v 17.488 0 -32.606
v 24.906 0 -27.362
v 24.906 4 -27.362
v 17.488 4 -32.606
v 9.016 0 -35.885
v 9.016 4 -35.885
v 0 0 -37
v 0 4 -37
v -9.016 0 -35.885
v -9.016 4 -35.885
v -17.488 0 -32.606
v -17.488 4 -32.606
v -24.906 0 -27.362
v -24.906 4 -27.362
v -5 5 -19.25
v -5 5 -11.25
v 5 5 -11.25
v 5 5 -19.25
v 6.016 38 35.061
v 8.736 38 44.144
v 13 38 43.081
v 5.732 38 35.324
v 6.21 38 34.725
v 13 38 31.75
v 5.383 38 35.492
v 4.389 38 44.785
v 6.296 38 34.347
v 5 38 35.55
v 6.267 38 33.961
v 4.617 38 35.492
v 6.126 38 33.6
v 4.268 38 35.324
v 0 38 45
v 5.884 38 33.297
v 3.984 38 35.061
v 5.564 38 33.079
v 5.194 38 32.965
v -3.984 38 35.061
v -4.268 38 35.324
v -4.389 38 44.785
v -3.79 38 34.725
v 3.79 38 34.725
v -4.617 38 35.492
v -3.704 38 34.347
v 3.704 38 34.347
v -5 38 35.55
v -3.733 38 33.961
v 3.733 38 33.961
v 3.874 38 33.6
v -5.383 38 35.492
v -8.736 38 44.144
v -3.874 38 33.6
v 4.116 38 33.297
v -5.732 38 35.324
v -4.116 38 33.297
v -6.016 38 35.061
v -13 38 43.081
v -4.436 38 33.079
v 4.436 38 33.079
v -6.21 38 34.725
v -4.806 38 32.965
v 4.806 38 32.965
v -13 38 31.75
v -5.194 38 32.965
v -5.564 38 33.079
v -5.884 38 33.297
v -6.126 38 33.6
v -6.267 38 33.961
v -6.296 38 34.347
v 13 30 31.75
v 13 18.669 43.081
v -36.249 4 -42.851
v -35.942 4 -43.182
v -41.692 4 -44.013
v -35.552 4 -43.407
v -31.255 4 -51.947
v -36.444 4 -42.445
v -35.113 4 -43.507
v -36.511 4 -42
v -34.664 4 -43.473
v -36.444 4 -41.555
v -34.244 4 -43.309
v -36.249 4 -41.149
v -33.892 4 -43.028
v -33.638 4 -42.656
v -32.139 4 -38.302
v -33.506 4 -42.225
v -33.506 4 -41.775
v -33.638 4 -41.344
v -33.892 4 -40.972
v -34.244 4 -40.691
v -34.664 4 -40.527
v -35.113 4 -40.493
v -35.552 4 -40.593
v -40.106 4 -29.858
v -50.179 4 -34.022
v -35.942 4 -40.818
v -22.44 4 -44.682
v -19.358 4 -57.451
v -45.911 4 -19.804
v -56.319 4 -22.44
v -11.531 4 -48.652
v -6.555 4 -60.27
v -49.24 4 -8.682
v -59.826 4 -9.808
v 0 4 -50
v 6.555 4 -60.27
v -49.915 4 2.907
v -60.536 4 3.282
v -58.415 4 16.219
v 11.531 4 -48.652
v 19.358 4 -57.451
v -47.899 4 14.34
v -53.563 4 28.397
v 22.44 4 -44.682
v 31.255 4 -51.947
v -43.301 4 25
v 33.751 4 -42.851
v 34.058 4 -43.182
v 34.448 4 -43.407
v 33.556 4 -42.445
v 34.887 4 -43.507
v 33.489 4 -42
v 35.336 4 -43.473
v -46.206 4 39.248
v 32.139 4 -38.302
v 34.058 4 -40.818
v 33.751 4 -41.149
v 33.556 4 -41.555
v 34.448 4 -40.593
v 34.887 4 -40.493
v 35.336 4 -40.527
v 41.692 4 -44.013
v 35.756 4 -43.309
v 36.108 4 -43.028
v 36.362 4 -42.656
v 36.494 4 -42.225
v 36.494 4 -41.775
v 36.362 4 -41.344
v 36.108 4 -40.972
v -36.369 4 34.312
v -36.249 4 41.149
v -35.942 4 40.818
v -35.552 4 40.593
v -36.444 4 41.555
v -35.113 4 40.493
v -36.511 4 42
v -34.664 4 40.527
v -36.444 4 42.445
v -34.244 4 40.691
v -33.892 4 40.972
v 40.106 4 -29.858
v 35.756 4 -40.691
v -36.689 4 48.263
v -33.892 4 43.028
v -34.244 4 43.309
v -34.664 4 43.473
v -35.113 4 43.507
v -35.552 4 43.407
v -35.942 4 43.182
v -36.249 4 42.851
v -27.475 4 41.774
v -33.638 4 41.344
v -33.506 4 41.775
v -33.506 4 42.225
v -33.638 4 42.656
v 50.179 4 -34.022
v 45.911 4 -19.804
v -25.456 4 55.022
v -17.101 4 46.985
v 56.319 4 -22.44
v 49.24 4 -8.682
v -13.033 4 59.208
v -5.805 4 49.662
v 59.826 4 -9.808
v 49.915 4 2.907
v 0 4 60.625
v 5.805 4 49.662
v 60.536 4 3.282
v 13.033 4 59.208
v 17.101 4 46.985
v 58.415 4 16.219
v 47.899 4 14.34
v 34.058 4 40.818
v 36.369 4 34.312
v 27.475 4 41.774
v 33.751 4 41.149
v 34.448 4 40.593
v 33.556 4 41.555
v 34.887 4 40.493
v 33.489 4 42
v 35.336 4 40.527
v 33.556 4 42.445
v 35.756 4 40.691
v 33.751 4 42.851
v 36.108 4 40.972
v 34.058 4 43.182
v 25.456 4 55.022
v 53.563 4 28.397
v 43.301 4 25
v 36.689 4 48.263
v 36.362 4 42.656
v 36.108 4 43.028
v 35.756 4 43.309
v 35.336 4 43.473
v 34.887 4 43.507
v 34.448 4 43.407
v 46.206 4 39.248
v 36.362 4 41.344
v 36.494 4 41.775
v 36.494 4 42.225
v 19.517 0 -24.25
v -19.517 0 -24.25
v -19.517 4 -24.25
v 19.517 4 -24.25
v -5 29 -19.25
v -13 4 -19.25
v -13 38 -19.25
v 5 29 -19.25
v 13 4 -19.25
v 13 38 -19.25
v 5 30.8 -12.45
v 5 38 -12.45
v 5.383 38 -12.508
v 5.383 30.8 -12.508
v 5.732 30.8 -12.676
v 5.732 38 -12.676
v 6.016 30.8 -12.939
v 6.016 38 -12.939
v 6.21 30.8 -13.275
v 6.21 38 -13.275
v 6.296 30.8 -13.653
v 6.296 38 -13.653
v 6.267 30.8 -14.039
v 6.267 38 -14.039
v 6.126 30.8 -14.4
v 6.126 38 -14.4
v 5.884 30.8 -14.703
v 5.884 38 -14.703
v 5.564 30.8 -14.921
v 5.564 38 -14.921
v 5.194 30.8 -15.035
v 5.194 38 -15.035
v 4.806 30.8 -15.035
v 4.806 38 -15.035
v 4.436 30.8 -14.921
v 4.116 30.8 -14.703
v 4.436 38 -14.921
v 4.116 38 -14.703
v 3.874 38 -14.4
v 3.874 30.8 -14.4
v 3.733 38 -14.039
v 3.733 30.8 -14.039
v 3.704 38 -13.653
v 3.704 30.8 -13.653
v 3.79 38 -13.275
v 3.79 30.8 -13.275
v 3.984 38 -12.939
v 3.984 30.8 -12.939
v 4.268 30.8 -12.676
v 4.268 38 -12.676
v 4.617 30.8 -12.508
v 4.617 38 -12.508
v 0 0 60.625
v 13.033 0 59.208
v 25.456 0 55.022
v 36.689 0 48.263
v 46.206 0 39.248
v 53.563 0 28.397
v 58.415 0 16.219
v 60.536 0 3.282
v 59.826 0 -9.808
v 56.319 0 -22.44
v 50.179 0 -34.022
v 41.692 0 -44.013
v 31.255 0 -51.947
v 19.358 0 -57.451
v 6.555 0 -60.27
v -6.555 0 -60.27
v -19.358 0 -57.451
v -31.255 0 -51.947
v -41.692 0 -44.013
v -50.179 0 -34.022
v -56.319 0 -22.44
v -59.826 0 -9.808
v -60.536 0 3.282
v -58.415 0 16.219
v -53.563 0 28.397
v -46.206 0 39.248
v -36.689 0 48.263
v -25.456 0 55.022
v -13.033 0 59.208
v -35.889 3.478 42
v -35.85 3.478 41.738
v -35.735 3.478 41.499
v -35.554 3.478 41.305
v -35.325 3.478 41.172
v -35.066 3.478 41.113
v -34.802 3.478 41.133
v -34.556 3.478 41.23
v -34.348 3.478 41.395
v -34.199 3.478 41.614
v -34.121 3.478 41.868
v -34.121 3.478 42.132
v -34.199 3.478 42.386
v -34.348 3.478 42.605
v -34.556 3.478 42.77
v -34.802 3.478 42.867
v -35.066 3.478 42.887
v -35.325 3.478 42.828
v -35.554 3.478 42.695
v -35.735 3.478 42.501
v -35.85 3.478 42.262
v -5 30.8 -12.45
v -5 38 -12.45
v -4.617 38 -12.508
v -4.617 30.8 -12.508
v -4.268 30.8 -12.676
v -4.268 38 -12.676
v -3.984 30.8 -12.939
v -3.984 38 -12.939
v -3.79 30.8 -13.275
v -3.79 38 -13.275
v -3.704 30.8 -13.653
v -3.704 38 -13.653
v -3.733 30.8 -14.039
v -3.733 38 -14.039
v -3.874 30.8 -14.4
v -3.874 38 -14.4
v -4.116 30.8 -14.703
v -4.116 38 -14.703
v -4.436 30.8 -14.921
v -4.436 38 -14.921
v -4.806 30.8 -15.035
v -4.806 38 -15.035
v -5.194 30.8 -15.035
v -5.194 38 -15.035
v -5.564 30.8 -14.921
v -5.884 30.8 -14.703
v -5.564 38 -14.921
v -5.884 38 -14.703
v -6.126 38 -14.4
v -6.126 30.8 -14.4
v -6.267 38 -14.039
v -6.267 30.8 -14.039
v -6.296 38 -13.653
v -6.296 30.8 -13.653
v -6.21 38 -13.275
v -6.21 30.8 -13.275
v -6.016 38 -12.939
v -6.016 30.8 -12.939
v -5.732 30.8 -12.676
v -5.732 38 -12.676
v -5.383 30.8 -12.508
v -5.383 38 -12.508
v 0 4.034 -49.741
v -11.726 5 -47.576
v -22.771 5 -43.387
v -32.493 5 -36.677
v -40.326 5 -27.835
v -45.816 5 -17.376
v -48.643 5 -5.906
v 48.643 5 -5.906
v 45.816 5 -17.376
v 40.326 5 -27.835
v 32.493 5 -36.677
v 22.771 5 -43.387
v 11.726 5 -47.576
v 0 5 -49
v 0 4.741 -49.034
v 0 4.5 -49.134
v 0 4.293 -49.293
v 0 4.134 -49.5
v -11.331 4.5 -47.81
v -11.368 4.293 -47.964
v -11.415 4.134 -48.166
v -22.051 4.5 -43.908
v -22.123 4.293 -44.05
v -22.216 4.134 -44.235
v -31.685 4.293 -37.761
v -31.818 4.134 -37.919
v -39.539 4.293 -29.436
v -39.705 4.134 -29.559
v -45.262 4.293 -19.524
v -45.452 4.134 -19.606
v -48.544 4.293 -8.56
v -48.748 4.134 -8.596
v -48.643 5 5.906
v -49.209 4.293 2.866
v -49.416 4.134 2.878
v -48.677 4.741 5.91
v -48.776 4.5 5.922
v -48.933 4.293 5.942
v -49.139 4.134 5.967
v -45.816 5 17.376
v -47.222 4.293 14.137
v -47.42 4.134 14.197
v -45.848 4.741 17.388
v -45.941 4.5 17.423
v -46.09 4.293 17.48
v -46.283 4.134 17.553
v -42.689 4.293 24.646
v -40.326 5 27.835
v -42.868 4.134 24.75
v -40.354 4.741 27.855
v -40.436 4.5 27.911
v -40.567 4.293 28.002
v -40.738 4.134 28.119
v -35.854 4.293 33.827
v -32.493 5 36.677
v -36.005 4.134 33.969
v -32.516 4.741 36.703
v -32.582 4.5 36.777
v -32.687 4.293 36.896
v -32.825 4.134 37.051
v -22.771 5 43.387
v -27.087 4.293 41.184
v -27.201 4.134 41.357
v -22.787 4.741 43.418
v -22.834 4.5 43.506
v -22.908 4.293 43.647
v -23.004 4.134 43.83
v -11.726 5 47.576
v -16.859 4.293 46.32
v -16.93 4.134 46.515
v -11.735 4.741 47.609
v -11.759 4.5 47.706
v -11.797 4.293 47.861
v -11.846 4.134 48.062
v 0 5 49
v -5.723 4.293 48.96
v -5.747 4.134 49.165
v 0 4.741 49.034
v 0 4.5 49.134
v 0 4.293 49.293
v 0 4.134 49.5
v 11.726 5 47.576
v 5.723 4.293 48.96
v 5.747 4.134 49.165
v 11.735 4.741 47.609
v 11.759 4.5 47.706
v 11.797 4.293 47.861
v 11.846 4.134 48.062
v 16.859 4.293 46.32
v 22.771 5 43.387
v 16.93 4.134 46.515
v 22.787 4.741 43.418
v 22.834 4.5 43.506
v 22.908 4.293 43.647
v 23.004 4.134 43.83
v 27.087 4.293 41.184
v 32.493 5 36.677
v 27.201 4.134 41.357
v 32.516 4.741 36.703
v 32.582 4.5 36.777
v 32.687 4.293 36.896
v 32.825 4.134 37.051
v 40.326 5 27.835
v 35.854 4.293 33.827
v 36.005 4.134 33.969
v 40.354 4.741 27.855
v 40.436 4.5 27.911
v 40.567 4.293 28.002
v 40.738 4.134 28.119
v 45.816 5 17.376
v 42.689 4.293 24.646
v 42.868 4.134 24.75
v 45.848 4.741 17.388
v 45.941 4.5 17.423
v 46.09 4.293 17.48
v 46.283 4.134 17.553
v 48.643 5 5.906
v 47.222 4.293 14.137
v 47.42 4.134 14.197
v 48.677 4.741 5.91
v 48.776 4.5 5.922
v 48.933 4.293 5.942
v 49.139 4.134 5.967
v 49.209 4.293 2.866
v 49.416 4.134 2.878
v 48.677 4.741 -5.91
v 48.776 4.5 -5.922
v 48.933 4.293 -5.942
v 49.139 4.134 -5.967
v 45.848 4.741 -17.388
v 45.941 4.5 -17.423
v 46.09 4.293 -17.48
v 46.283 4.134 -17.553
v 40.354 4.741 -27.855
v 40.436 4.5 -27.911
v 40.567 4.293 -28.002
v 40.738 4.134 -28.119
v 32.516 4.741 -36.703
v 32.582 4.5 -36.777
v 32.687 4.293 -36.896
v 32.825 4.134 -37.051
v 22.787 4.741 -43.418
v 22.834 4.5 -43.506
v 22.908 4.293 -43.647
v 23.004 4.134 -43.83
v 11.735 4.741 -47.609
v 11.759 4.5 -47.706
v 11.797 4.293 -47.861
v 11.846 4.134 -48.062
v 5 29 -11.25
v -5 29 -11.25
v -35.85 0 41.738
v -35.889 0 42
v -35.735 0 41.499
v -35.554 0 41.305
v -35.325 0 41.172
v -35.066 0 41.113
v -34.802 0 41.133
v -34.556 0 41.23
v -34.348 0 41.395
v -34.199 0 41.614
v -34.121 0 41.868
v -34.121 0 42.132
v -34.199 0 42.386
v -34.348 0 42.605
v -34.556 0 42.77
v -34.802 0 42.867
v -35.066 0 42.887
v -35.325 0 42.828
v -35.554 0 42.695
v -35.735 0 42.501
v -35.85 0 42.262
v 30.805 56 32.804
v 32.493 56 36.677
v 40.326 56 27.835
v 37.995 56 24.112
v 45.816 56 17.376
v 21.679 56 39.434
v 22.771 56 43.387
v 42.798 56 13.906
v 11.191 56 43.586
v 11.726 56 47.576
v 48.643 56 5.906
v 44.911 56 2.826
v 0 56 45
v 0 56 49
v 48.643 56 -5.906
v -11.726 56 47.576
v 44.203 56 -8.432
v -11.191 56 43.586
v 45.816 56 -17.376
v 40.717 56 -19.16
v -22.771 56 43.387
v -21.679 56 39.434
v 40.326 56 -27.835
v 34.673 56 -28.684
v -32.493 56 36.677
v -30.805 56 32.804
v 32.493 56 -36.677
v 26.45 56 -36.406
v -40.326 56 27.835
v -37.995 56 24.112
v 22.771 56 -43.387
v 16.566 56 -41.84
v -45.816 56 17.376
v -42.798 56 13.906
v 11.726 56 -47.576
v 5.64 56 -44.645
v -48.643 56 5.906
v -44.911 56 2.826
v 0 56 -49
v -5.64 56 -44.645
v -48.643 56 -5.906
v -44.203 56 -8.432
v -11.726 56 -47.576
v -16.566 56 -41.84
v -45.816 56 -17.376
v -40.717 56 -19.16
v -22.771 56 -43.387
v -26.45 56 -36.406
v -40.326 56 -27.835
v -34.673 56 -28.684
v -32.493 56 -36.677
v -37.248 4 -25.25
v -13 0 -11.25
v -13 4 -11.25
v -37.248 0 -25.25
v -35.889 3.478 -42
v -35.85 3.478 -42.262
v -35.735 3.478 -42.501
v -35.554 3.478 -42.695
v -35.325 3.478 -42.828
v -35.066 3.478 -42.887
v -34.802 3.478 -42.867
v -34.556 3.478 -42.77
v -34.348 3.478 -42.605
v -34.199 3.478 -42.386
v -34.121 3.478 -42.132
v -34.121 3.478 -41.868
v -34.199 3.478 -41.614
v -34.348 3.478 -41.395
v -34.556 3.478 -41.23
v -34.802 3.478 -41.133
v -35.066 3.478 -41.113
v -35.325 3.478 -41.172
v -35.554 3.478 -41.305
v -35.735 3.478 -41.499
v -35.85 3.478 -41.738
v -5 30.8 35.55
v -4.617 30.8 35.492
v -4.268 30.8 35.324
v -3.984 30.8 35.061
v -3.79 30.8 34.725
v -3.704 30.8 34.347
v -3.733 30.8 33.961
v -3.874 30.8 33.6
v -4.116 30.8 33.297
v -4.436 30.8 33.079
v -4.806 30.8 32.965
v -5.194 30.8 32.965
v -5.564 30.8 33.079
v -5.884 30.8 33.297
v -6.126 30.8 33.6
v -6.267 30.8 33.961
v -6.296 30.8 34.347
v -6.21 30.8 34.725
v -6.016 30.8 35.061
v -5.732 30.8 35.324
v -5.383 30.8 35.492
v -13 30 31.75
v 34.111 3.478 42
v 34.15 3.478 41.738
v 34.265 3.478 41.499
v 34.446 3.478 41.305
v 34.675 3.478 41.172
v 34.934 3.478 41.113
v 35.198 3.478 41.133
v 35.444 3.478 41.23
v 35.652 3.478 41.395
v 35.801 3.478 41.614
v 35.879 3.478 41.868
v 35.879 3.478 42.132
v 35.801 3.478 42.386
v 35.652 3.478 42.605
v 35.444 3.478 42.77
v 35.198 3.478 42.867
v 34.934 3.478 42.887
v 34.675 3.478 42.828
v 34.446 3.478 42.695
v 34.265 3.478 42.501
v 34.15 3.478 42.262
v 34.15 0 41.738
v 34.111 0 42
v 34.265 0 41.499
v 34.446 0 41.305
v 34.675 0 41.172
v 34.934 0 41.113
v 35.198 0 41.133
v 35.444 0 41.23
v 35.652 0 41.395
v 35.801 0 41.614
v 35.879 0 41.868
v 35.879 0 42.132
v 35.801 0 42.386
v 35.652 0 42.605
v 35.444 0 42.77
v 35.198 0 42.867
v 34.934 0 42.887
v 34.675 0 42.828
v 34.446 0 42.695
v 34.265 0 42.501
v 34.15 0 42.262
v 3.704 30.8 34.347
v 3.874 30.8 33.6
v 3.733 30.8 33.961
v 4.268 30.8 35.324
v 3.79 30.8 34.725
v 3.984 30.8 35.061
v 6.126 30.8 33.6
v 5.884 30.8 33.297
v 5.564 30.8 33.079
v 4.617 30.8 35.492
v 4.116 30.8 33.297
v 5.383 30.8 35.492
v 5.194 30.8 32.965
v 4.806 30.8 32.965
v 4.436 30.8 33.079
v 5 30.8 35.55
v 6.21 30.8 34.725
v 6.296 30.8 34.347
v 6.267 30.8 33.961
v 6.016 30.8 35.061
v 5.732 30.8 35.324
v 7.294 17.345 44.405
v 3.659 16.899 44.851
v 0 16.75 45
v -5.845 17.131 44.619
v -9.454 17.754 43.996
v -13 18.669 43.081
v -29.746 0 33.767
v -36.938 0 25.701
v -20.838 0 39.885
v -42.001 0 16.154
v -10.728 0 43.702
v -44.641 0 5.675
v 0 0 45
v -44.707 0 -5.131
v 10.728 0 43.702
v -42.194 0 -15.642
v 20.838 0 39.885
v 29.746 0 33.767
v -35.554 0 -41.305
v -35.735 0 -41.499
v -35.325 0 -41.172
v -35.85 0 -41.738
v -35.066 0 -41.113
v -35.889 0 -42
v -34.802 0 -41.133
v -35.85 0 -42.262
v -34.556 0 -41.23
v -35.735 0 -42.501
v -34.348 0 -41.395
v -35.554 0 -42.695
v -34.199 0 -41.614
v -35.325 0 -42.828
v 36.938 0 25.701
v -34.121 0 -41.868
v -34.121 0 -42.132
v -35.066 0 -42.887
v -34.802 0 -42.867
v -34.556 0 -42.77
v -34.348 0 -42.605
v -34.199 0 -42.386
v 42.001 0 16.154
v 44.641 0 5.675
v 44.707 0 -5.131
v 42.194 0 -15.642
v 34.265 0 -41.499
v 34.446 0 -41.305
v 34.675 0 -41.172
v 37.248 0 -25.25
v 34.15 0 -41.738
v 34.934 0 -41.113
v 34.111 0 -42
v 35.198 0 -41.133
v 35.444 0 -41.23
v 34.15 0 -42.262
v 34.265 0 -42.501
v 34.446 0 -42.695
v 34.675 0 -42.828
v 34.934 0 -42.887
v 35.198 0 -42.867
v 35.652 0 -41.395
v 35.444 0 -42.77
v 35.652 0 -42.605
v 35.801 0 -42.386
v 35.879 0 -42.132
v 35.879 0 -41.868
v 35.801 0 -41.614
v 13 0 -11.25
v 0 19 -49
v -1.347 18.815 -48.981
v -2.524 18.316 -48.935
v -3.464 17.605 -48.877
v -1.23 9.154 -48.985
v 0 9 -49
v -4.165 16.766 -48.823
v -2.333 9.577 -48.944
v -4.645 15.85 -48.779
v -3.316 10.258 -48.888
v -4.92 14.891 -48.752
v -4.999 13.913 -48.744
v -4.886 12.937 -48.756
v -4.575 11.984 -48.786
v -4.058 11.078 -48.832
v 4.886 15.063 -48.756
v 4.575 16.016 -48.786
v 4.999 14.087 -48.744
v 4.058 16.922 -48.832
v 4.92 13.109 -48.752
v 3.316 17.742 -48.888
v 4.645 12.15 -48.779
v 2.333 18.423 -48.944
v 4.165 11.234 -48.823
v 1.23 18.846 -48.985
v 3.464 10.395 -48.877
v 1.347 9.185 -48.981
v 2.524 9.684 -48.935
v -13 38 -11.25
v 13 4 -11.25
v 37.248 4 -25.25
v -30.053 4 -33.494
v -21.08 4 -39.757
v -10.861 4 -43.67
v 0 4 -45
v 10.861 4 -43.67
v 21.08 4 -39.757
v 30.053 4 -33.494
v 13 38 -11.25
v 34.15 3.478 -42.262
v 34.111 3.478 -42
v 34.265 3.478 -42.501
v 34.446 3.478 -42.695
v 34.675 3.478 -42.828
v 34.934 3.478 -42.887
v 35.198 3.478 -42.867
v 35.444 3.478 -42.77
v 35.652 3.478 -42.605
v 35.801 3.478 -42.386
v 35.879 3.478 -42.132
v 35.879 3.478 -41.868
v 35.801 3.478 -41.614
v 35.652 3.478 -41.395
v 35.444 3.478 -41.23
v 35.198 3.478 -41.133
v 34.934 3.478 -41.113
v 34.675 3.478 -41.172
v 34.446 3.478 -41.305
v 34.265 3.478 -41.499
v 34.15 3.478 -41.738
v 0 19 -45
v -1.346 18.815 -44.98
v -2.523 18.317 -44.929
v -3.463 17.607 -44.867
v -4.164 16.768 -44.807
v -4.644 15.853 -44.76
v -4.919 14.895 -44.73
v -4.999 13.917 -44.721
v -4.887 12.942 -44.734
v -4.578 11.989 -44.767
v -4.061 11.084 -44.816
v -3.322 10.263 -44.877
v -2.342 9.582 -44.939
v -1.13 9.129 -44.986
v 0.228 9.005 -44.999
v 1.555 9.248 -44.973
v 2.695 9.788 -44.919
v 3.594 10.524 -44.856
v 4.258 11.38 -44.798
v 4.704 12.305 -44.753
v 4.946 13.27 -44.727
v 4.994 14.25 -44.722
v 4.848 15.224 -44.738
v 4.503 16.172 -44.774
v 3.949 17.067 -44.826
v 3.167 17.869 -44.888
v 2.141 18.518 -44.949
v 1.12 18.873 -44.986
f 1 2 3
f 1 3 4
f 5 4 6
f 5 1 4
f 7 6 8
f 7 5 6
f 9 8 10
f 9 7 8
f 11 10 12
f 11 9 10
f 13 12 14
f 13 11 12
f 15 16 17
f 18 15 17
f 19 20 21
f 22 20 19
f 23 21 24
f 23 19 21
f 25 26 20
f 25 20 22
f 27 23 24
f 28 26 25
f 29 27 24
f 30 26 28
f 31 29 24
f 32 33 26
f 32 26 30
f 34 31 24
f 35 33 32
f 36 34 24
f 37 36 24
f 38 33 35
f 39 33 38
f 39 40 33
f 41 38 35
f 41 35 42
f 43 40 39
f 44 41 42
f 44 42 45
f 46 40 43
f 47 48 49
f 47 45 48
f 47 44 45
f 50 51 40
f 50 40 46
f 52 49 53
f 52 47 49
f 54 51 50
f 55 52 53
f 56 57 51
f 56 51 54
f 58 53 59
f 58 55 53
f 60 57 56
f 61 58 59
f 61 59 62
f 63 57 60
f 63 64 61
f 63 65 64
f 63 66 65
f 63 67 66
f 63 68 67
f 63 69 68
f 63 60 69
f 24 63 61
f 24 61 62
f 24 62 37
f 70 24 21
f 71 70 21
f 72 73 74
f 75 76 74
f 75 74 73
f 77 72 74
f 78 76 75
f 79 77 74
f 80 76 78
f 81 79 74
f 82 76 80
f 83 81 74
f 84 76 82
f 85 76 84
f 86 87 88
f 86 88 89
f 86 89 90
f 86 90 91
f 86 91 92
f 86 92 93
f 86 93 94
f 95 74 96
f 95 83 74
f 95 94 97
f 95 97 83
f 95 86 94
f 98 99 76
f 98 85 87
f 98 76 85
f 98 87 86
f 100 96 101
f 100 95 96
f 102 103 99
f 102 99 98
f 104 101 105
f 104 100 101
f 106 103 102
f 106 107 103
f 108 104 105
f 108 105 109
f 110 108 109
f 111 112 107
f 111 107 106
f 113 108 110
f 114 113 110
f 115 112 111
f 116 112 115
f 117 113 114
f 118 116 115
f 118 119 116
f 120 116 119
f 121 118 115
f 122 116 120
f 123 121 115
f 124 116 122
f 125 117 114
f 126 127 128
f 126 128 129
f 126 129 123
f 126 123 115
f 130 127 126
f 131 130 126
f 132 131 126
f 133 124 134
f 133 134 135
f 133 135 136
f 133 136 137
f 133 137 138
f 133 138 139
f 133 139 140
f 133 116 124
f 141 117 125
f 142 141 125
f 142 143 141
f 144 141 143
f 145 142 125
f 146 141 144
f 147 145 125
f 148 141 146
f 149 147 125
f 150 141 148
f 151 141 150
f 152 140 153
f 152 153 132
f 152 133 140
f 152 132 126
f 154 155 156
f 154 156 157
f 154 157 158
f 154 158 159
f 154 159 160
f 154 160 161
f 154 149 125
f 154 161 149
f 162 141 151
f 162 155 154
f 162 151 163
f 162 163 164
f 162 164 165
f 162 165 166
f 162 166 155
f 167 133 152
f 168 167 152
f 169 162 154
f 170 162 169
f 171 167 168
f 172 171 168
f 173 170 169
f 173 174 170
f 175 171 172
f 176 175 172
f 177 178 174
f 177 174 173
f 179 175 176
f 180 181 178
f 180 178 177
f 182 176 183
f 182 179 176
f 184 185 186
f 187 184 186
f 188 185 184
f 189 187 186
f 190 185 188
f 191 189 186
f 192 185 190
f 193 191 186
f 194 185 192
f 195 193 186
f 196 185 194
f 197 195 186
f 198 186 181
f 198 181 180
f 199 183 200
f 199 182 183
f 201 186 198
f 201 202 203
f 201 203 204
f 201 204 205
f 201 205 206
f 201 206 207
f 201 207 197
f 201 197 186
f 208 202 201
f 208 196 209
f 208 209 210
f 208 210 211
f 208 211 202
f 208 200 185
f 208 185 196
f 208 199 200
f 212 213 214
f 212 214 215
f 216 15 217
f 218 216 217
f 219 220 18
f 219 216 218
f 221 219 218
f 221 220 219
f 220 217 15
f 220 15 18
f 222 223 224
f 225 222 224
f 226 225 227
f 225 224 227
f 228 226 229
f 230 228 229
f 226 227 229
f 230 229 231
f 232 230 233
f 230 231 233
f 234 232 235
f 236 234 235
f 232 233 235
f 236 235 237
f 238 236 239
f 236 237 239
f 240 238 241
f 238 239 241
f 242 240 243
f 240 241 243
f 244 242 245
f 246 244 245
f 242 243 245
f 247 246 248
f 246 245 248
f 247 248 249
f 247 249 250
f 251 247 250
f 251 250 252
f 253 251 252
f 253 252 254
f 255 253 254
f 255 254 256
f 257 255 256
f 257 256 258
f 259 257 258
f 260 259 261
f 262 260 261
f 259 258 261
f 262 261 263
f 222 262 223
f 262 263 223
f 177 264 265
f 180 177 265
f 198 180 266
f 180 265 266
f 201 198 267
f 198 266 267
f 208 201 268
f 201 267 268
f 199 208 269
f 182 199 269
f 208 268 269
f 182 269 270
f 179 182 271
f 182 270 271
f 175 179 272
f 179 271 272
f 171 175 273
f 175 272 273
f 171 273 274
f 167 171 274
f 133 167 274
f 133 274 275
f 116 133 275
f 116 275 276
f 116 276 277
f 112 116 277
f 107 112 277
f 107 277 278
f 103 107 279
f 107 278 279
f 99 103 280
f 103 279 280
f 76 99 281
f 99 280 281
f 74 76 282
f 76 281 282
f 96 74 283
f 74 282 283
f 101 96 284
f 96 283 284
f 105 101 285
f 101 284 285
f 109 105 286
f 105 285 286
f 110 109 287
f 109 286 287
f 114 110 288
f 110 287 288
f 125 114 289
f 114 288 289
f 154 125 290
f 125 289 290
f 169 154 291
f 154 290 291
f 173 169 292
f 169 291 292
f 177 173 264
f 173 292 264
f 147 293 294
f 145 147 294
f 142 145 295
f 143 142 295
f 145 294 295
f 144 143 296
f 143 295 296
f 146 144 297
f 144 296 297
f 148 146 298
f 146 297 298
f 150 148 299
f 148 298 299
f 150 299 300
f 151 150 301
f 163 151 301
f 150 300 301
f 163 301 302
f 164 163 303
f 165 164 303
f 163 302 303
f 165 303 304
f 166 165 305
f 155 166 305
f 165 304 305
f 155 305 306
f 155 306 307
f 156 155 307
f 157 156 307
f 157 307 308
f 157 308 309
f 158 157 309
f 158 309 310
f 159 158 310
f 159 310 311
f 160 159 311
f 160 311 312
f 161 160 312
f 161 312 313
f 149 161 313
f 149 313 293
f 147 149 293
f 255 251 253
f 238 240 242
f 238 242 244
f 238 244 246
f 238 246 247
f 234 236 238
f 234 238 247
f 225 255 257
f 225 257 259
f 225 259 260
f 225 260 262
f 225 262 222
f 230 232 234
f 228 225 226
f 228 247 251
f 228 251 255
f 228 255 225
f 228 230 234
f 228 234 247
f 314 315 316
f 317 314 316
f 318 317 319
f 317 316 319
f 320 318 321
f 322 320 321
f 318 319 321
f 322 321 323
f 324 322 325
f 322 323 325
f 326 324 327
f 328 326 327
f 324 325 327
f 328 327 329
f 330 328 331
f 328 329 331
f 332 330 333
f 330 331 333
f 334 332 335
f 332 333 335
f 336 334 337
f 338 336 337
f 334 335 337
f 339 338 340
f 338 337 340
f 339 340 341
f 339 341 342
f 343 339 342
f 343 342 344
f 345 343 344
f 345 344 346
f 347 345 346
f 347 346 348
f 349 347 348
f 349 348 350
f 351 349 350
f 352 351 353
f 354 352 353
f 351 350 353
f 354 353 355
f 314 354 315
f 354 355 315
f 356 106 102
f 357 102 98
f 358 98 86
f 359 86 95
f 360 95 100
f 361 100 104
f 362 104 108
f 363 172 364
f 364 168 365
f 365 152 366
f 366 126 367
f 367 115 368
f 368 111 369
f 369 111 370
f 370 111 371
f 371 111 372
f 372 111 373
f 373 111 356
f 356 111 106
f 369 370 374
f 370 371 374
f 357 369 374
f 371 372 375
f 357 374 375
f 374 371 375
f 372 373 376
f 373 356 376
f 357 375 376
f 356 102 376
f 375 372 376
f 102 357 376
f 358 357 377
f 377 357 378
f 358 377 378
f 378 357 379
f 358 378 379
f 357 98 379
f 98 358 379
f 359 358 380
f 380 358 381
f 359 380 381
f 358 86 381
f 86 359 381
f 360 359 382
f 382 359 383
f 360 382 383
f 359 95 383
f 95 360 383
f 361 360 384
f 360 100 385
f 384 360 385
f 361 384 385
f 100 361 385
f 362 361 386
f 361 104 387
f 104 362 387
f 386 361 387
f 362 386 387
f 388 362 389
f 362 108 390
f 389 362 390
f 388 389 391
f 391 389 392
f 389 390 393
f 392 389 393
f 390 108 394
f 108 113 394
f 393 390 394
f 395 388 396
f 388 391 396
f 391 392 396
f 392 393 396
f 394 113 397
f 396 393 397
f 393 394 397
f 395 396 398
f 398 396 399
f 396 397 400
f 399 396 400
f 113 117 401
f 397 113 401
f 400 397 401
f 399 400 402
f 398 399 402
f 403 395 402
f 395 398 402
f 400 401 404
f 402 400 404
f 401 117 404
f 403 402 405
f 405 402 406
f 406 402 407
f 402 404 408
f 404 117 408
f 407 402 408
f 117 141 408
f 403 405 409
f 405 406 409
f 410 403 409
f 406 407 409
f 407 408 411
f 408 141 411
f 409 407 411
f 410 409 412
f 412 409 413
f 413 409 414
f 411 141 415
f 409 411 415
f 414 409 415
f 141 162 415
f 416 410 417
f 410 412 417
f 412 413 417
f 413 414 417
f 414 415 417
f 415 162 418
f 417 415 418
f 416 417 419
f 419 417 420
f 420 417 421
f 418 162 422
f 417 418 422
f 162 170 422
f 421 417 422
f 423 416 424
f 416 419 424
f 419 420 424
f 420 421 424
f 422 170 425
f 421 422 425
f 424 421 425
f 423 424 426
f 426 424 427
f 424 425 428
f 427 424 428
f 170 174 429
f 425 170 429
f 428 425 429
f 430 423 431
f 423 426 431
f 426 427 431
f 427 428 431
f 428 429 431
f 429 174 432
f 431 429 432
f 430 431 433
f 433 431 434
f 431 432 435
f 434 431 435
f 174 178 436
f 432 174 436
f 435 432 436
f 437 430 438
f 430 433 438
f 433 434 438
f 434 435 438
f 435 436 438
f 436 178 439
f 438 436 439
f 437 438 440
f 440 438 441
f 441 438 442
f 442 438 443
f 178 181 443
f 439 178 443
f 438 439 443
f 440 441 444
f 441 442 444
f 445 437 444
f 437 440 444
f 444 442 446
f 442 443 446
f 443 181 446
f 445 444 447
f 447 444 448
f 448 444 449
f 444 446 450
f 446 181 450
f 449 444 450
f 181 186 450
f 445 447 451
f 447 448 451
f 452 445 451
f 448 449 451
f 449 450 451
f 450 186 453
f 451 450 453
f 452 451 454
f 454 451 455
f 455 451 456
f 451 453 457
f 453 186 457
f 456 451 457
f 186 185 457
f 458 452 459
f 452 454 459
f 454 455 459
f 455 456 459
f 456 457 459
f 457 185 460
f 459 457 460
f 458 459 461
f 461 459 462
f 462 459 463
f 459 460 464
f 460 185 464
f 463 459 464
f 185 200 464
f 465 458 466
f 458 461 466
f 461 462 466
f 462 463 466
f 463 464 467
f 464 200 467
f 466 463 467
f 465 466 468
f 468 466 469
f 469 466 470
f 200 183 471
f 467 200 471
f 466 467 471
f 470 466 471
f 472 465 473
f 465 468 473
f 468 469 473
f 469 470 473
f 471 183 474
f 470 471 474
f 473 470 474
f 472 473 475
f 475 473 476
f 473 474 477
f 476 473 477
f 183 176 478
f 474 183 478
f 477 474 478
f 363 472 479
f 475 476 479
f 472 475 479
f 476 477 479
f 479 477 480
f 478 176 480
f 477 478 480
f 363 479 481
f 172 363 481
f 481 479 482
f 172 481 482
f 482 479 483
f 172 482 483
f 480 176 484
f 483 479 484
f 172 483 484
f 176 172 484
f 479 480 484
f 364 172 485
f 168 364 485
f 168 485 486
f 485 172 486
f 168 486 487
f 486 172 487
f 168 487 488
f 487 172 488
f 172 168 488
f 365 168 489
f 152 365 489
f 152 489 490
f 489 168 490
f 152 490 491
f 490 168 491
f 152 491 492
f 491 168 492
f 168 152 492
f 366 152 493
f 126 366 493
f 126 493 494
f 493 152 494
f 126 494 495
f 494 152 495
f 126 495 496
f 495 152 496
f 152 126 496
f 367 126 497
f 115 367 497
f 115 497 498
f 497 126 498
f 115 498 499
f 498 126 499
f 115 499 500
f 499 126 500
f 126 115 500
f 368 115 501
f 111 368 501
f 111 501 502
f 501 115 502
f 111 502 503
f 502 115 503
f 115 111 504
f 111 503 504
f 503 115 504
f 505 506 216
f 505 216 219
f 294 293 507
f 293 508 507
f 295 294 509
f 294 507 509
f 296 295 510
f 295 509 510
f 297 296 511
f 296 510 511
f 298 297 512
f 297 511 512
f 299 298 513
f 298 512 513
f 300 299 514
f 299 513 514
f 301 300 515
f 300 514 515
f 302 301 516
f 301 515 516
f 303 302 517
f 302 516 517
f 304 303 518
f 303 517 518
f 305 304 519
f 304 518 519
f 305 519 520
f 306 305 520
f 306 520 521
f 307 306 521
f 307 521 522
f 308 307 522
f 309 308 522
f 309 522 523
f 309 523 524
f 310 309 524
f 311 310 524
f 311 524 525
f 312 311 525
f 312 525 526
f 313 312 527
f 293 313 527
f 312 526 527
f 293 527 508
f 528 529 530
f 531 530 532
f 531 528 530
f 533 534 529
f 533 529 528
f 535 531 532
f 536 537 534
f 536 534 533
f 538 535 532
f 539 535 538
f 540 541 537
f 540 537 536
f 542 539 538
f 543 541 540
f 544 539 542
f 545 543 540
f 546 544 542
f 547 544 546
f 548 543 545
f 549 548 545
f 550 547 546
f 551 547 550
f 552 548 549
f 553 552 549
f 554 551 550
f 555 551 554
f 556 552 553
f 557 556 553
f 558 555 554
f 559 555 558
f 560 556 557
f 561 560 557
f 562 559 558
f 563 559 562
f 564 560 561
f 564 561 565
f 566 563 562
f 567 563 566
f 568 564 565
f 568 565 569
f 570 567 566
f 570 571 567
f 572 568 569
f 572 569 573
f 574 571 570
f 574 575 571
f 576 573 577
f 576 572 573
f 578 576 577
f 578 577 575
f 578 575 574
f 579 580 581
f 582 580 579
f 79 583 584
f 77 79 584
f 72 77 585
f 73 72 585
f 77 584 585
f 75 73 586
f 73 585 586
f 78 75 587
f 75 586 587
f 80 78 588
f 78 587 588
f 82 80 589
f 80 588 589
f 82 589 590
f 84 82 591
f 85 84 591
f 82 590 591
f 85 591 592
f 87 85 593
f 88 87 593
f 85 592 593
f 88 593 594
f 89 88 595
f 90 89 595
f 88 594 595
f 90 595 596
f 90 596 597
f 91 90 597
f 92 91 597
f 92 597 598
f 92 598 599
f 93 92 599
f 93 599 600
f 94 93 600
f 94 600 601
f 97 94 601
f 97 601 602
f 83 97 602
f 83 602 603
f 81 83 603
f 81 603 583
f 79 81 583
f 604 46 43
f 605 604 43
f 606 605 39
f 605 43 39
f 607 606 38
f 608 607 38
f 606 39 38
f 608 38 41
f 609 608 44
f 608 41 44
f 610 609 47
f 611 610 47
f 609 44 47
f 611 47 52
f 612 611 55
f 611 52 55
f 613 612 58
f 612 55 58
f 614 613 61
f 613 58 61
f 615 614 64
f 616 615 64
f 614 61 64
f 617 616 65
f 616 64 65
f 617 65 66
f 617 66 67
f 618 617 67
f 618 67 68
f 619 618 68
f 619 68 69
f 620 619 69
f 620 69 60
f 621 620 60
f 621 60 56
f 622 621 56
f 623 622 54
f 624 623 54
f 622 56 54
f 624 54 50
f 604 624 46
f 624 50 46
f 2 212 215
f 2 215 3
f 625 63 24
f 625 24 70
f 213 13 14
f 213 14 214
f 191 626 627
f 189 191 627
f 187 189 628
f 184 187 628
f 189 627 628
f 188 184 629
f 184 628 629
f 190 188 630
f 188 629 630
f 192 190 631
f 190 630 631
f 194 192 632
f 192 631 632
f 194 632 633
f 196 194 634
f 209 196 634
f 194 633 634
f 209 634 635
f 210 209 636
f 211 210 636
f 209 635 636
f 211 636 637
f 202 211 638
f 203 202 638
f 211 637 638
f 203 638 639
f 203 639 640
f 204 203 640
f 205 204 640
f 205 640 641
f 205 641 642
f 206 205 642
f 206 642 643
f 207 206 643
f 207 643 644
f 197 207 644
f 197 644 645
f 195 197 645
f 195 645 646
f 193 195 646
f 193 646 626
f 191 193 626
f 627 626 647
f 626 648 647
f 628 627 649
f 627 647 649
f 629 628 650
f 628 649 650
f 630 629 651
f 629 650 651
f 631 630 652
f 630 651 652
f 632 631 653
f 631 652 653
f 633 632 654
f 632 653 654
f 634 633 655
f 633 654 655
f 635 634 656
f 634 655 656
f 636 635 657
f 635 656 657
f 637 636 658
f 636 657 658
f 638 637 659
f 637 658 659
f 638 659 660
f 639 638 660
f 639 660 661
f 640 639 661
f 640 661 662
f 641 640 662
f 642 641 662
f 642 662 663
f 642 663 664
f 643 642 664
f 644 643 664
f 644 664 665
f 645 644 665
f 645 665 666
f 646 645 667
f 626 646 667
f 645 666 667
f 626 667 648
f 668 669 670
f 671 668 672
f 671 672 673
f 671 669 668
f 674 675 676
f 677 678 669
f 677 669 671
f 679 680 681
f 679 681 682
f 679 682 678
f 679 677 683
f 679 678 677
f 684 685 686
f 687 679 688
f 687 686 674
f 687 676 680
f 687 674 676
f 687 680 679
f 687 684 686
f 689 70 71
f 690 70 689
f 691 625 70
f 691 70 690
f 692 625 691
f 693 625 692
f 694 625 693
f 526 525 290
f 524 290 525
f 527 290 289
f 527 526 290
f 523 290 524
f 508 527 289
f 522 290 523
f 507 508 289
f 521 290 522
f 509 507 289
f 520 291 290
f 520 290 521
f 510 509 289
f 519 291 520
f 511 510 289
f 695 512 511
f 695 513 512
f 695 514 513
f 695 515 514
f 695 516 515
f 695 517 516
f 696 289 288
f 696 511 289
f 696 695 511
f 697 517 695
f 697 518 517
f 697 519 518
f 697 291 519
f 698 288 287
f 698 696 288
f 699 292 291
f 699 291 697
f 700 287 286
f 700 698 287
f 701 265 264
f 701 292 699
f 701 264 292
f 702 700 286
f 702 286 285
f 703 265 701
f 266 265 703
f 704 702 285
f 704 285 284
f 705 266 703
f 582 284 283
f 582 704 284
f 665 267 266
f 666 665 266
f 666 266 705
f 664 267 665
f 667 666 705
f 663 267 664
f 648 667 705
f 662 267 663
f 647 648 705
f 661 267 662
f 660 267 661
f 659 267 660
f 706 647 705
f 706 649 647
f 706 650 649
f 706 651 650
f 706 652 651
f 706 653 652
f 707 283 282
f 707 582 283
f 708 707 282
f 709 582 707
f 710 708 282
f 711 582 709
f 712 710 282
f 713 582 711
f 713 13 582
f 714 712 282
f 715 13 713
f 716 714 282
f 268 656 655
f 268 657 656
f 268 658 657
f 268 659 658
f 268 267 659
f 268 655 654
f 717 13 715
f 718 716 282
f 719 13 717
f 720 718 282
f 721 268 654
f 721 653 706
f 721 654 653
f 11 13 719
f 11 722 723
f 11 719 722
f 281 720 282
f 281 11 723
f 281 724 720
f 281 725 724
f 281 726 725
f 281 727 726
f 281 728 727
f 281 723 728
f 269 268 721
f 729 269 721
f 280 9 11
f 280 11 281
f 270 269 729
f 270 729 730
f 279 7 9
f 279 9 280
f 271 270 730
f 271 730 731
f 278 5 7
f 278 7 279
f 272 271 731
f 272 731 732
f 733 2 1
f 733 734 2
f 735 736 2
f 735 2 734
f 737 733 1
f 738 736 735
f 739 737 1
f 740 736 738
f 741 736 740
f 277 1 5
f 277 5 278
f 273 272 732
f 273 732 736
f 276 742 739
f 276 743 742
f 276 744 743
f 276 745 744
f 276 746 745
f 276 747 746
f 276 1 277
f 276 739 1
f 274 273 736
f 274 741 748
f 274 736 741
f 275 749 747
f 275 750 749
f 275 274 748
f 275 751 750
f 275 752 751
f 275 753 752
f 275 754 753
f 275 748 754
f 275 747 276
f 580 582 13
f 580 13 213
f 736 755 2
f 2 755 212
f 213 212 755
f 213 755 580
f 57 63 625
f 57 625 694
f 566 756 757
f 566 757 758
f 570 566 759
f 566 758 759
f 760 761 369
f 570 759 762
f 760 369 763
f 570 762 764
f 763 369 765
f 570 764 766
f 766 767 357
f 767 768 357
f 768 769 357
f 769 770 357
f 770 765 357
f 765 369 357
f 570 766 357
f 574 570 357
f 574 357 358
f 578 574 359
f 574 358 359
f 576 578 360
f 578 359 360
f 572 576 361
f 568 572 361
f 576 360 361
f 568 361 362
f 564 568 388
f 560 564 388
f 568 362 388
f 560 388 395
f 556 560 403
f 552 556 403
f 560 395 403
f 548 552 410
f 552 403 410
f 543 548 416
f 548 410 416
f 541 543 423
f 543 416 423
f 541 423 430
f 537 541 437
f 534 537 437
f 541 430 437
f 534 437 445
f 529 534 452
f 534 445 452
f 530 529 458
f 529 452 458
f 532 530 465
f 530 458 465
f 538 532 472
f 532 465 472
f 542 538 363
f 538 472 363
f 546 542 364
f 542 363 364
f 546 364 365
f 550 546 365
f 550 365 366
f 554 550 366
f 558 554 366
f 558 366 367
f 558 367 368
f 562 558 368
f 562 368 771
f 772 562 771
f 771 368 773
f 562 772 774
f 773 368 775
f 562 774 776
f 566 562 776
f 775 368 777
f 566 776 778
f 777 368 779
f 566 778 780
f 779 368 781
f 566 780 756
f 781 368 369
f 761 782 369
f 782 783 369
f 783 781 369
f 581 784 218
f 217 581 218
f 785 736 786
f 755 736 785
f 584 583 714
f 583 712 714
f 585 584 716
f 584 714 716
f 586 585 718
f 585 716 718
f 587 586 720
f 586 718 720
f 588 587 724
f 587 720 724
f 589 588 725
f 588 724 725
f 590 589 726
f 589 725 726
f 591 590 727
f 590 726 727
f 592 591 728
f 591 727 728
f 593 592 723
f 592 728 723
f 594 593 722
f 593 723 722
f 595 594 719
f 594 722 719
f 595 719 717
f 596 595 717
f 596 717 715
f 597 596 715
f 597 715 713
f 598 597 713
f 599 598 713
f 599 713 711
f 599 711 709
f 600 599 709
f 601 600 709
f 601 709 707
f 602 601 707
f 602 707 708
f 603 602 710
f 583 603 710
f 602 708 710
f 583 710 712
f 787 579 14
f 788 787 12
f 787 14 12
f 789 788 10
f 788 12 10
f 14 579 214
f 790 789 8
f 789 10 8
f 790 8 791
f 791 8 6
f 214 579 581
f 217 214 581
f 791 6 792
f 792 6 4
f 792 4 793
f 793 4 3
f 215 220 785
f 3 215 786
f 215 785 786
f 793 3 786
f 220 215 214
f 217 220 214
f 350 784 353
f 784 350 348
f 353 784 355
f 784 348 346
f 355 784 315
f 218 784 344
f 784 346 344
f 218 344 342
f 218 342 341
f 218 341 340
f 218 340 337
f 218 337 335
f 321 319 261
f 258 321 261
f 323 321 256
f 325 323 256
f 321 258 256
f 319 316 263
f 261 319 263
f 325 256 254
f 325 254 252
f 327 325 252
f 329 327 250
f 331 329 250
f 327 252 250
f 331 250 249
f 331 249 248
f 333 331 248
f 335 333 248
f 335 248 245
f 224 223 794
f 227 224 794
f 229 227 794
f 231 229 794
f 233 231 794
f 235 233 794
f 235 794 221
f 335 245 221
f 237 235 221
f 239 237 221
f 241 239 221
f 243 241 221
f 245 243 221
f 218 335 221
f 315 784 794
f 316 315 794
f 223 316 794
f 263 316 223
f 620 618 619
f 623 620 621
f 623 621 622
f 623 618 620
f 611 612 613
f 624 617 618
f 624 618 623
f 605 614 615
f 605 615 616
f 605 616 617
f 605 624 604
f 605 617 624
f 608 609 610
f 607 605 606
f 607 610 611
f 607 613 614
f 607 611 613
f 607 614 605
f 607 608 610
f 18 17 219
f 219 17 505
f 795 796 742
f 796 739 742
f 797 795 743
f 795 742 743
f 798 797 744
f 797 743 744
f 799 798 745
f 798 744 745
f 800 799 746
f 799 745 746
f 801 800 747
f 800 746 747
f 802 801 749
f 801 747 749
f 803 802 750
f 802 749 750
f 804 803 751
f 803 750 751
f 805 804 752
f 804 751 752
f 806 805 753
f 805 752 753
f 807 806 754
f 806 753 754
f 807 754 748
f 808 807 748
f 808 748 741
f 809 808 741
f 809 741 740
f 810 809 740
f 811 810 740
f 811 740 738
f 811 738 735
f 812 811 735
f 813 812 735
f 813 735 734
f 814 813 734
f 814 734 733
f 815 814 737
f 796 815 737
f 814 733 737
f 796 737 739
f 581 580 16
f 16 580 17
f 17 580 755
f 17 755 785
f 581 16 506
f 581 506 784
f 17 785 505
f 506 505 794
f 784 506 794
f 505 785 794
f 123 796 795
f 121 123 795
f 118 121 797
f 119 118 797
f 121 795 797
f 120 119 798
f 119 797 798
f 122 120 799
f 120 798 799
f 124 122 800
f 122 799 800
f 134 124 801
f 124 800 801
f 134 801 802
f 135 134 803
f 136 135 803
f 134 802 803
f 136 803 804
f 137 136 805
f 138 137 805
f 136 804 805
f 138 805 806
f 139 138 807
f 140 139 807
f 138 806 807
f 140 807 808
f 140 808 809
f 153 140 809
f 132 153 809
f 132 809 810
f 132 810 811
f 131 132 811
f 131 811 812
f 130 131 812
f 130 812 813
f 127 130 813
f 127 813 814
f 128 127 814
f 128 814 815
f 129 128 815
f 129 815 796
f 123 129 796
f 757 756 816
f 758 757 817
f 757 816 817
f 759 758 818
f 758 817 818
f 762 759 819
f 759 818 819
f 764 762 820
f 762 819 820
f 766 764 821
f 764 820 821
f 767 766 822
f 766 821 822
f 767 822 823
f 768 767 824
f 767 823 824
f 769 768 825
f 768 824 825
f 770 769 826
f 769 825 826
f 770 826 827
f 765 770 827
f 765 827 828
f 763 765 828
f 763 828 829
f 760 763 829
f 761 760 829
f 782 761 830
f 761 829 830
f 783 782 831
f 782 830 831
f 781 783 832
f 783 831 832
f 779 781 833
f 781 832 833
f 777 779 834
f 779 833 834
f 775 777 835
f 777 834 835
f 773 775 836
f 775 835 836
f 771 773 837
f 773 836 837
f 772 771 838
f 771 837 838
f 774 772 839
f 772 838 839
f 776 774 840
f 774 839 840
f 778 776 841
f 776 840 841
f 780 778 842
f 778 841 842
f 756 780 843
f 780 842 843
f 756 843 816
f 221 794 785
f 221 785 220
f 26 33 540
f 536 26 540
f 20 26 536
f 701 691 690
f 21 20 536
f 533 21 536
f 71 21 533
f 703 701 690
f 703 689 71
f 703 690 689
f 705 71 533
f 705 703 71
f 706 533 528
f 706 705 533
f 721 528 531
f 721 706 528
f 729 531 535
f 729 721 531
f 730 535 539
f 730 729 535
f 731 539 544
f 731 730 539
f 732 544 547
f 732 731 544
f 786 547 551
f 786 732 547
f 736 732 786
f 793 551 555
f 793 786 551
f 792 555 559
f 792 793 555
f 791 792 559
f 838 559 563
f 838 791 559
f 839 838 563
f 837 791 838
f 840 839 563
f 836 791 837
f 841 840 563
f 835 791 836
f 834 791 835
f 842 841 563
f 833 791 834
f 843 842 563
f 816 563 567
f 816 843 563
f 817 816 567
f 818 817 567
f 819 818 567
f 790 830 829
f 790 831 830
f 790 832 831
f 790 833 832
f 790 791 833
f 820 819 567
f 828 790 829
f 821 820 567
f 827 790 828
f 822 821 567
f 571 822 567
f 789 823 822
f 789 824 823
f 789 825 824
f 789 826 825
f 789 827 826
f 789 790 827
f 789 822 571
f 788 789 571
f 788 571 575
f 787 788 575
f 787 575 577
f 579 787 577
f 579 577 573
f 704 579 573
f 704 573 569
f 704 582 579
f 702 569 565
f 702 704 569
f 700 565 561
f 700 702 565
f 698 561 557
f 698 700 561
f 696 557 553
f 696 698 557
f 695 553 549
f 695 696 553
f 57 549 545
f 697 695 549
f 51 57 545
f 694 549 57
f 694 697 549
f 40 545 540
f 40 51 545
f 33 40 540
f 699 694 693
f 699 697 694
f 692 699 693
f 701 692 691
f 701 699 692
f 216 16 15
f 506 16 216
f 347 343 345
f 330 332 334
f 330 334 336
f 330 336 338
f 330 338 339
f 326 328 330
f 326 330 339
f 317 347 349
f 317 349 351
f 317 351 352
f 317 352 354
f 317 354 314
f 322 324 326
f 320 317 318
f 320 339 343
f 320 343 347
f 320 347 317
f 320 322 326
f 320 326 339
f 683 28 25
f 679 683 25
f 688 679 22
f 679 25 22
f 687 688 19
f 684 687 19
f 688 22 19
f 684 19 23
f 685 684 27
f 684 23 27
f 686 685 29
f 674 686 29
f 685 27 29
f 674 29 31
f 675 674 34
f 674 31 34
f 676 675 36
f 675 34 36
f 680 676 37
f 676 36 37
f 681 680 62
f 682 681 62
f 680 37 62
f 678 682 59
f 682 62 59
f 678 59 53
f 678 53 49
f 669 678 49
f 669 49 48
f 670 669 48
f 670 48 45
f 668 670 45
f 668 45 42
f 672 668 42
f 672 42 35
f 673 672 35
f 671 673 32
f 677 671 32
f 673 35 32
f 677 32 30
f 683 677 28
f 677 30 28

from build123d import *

# Parameters (mm, degrees)
SKETCH1_R                                         = 60.625
SKETCH1_R_2                                       = 45
BOSS_EXTRUDE1_DEPTH                               = 4
SKETCH2_R                                         = 49
SKETCH2_R_2                                       = 45
BOSS_EXTRUDE2_DEPTH                               = 52
SKETCH3_W                                         = 8
SKETCH3_H                                         = 38
BOSS_EXTRUDE3_DEPTH                               = 13
SKETCH5_W                                         = 10
SKETCH5_H                                         = 24
CUT_EXTRUDE1_DEPTH                                = 23
SKETCH6_R                                         = 5
CUT_EXTRUDE2_DEPTH                                = 60
SKETCH7_R                                         = 1.3
CUT_EXTRUDE3_DEPTH                                = 7.2
BOSS_EXTRUDE4_DEPTH                               = 4
CSK_FOR_0_FLAT_HEAD_MACHINE_SCREW_100_D           = 1.778
CSK_FOR_0_FLAT_HEAD_MACHINE_SCREW_100_CSINK_D     = 3.0226
CSK_FOR_0_FLAT_HEAD_MACHINE_SCREW_100_CSINK_ANGLE = 100
FILLET1_R                                         = 1


with BuildPart() as part:
    # Sketch1 → Boss-Extrude1 (new body)
    with BuildSketch(Plane(origin=(0, 0, 0), x_dir=(1, 0, 0), z_dir=(0, 1, 0))):
        with Locations(Location((0, 0, 0), (0, 0, 270))):
            Circle(SKETCH1_R)
        with Locations(Location((0, 0, 0), (0, 0, 270))):
            Circle(SKETCH1_R_2, mode=Mode.SUBTRACT)
    extrude(amount=BOSS_EXTRUDE1_DEPTH)

    # Sketch2 → Boss-Extrude2 (add)
    with BuildSketch(Plane(origin=(0, 4, 0), x_dir=(1, 0, 0), z_dir=(0, 1, 0))):
        with Locations(Location((0, 0, 0), (0, 0, 90))):
            Circle(SKETCH2_R)
        with Locations(Location((0, 0, 0), (0, 0, 270))):
            Circle(SKETCH2_R_2, mode=Mode.SUBTRACT)
    extrude(amount=BOSS_EXTRUDE2_DEPTH)

    # Sketch3 → Boss-Extrude3 (add, symmetric)
    with BuildSketch(Plane(origin=(0, 0, 0), x_dir=(0, 0, -1), z_dir=(1, 0, 0))):
        Polygon((-45, 38), (-31.75, 38), (-31.75, 30), (-45, 16.75), align=None)
        with Locations((15.25, 19)):
            Rectangle(SKETCH3_W, SKETCH3_H)
    extrude(amount=BOSS_EXTRUDE3_DEPTH, both=True)


with BuildPart() as boss_extrude3_piece_1:
    # of the separate pieces the step leaves, piece 1, a body of its own (boss_extrude3_pieces)
    add(part.part.solids().sort_by_distance((0, 0, 60.625))[0])

    # Sketch6 → Cut-Extrude2 (cut)
    with BuildSketch(Plane.XY.offset(-11.25)):
        with Locations(Location((0, 14, 0), (0, 0, 90))):
            Circle(SKETCH6_R)
    extrude(amount=-CUT_EXTRUDE2_DEPTH, mode=Mode.SUBTRACT)


with BuildPart() as boss_extrude3_piece_2:
    # of the separate pieces the step leaves, piece 2, a body of its own (boss_extrude3_pieces)
    add(part.part.solids().sort_by_distance((-13, 0, -19.25))[0])

    # Sketch5 → Cut-Extrude1 (cut)
    with BuildSketch(Plane.XY.offset(-11.25)):
        with Locations((0, 17)):
            Rectangle(SKETCH5_W, SKETCH5_H)
    extrude(amount=-CUT_EXTRUDE1_DEPTH, mode=Mode.SUBTRACT)


with BuildPart() as cut_extrude3_tool:
    # Sketch7 → Cut-Extrude3 (new body)
    with BuildSketch(Plane(origin=(0, 38, 0), x_dir=(1, 0, 0), z_dir=(0, 1, 0))):
        with Locations(Location((-5, 13.75, 0), (0, 0, 270))):
            Circle(SKETCH7_R)
        with Locations(Location((5, 13.75, 0), (0, 0, 270))):
            Circle(SKETCH7_R)
        with Locations(Location((5, -34.25, 0), (0, 0, 270))):
            Circle(SKETCH7_R)
        with Locations(Location((-5, -34.25, 0), (0, 0, 270))):
            Circle(SKETCH7_R)
    extrude(amount=-CUT_EXTRUDE3_DEPTH)


with BuildPart() as boss_extrude3_piece_1_1:
    add(boss_extrude3_piece_1.part)

    # Cut-Extrude3: cut by cut_extrude3_tool
    add(cut_extrude3_tool.part, mode=Mode.SUBTRACT)



with BuildPart() as boss_extrude3_piece_2_1:
    add(boss_extrude3_piece_2.part)

    # Cut-Extrude3: cut by cut_extrude3_tool
    add(cut_extrude3_tool.part, mode=Mode.SUBTRACT)


with BuildPart() as boss_extrude3_piece_1_2:
    add(boss_extrude3_piece_1_1.part)

    add(boss_extrude3_piece_2_1.part)  # Boss-Extrude4 merges Boss-Extrude3 piece 2
    # Sketch8 → Boss-Extrude4 (add)
    with BuildSketch(Plane.XZ):
        with BuildLine():
            Line((13, -11.25), (-13, -11.25))
            Line((-13, -11.25), (-37.248431585, -25.249838503))
            ThreePointArc((-37.248431585, -25.249838503), (0, -45), (37.248431585, -25.249838503))
            Line((37.248431585, -25.249838503), (13, -11.25))
        make_face()
        with BuildLine():
            Line((19.516660498, -24.25), (24.906460381, -27.361802413))
            ThreePointArc((24.906460381, -27.361802413), (0, -37), (-24.906460381, -27.361802413))
            Line((-24.906460381, -27.361802413), (-19.516660498, -24.25))
            Line((-19.516660498, -24.25), (19.516660498, -24.25))
        make_face(mode=Mode.SUBTRACT)
    extrude(amount=-BOSS_EXTRUDE4_DEPTH)

    # CSK for #0 Flat Head Machine Screw (100)1 (through all)
    with Locations(Plane(origin=(0, 4, 0), x_dir=(1, 0, 0), z_dir=(0, 1, 0))):
        with Locations((-35, 42), (35, 42), (35, -42), (-35, -42)):
            CounterSinkHole(CSK_FOR_0_FLAT_HEAD_MACHINE_SCREW_100_D / 2, CSK_FOR_0_FLAT_HEAD_MACHINE_SCREW_100_CSINK_D / 2, counter_sink_angle=CSK_FOR_0_FLAT_HEAD_MACHINE_SCREW_100_CSINK_ANGLE)

    # Fillet1
    fillet1_edges = [boss_extrude3_piece_1_2.edges().sort_by_distance(p)[0] for p in [
        (0, 4, 49),
    ]]
    fillet(fillet1_edges, radius=FILLET1_R)


solid = boss_extrude3_piece_1_2.part
